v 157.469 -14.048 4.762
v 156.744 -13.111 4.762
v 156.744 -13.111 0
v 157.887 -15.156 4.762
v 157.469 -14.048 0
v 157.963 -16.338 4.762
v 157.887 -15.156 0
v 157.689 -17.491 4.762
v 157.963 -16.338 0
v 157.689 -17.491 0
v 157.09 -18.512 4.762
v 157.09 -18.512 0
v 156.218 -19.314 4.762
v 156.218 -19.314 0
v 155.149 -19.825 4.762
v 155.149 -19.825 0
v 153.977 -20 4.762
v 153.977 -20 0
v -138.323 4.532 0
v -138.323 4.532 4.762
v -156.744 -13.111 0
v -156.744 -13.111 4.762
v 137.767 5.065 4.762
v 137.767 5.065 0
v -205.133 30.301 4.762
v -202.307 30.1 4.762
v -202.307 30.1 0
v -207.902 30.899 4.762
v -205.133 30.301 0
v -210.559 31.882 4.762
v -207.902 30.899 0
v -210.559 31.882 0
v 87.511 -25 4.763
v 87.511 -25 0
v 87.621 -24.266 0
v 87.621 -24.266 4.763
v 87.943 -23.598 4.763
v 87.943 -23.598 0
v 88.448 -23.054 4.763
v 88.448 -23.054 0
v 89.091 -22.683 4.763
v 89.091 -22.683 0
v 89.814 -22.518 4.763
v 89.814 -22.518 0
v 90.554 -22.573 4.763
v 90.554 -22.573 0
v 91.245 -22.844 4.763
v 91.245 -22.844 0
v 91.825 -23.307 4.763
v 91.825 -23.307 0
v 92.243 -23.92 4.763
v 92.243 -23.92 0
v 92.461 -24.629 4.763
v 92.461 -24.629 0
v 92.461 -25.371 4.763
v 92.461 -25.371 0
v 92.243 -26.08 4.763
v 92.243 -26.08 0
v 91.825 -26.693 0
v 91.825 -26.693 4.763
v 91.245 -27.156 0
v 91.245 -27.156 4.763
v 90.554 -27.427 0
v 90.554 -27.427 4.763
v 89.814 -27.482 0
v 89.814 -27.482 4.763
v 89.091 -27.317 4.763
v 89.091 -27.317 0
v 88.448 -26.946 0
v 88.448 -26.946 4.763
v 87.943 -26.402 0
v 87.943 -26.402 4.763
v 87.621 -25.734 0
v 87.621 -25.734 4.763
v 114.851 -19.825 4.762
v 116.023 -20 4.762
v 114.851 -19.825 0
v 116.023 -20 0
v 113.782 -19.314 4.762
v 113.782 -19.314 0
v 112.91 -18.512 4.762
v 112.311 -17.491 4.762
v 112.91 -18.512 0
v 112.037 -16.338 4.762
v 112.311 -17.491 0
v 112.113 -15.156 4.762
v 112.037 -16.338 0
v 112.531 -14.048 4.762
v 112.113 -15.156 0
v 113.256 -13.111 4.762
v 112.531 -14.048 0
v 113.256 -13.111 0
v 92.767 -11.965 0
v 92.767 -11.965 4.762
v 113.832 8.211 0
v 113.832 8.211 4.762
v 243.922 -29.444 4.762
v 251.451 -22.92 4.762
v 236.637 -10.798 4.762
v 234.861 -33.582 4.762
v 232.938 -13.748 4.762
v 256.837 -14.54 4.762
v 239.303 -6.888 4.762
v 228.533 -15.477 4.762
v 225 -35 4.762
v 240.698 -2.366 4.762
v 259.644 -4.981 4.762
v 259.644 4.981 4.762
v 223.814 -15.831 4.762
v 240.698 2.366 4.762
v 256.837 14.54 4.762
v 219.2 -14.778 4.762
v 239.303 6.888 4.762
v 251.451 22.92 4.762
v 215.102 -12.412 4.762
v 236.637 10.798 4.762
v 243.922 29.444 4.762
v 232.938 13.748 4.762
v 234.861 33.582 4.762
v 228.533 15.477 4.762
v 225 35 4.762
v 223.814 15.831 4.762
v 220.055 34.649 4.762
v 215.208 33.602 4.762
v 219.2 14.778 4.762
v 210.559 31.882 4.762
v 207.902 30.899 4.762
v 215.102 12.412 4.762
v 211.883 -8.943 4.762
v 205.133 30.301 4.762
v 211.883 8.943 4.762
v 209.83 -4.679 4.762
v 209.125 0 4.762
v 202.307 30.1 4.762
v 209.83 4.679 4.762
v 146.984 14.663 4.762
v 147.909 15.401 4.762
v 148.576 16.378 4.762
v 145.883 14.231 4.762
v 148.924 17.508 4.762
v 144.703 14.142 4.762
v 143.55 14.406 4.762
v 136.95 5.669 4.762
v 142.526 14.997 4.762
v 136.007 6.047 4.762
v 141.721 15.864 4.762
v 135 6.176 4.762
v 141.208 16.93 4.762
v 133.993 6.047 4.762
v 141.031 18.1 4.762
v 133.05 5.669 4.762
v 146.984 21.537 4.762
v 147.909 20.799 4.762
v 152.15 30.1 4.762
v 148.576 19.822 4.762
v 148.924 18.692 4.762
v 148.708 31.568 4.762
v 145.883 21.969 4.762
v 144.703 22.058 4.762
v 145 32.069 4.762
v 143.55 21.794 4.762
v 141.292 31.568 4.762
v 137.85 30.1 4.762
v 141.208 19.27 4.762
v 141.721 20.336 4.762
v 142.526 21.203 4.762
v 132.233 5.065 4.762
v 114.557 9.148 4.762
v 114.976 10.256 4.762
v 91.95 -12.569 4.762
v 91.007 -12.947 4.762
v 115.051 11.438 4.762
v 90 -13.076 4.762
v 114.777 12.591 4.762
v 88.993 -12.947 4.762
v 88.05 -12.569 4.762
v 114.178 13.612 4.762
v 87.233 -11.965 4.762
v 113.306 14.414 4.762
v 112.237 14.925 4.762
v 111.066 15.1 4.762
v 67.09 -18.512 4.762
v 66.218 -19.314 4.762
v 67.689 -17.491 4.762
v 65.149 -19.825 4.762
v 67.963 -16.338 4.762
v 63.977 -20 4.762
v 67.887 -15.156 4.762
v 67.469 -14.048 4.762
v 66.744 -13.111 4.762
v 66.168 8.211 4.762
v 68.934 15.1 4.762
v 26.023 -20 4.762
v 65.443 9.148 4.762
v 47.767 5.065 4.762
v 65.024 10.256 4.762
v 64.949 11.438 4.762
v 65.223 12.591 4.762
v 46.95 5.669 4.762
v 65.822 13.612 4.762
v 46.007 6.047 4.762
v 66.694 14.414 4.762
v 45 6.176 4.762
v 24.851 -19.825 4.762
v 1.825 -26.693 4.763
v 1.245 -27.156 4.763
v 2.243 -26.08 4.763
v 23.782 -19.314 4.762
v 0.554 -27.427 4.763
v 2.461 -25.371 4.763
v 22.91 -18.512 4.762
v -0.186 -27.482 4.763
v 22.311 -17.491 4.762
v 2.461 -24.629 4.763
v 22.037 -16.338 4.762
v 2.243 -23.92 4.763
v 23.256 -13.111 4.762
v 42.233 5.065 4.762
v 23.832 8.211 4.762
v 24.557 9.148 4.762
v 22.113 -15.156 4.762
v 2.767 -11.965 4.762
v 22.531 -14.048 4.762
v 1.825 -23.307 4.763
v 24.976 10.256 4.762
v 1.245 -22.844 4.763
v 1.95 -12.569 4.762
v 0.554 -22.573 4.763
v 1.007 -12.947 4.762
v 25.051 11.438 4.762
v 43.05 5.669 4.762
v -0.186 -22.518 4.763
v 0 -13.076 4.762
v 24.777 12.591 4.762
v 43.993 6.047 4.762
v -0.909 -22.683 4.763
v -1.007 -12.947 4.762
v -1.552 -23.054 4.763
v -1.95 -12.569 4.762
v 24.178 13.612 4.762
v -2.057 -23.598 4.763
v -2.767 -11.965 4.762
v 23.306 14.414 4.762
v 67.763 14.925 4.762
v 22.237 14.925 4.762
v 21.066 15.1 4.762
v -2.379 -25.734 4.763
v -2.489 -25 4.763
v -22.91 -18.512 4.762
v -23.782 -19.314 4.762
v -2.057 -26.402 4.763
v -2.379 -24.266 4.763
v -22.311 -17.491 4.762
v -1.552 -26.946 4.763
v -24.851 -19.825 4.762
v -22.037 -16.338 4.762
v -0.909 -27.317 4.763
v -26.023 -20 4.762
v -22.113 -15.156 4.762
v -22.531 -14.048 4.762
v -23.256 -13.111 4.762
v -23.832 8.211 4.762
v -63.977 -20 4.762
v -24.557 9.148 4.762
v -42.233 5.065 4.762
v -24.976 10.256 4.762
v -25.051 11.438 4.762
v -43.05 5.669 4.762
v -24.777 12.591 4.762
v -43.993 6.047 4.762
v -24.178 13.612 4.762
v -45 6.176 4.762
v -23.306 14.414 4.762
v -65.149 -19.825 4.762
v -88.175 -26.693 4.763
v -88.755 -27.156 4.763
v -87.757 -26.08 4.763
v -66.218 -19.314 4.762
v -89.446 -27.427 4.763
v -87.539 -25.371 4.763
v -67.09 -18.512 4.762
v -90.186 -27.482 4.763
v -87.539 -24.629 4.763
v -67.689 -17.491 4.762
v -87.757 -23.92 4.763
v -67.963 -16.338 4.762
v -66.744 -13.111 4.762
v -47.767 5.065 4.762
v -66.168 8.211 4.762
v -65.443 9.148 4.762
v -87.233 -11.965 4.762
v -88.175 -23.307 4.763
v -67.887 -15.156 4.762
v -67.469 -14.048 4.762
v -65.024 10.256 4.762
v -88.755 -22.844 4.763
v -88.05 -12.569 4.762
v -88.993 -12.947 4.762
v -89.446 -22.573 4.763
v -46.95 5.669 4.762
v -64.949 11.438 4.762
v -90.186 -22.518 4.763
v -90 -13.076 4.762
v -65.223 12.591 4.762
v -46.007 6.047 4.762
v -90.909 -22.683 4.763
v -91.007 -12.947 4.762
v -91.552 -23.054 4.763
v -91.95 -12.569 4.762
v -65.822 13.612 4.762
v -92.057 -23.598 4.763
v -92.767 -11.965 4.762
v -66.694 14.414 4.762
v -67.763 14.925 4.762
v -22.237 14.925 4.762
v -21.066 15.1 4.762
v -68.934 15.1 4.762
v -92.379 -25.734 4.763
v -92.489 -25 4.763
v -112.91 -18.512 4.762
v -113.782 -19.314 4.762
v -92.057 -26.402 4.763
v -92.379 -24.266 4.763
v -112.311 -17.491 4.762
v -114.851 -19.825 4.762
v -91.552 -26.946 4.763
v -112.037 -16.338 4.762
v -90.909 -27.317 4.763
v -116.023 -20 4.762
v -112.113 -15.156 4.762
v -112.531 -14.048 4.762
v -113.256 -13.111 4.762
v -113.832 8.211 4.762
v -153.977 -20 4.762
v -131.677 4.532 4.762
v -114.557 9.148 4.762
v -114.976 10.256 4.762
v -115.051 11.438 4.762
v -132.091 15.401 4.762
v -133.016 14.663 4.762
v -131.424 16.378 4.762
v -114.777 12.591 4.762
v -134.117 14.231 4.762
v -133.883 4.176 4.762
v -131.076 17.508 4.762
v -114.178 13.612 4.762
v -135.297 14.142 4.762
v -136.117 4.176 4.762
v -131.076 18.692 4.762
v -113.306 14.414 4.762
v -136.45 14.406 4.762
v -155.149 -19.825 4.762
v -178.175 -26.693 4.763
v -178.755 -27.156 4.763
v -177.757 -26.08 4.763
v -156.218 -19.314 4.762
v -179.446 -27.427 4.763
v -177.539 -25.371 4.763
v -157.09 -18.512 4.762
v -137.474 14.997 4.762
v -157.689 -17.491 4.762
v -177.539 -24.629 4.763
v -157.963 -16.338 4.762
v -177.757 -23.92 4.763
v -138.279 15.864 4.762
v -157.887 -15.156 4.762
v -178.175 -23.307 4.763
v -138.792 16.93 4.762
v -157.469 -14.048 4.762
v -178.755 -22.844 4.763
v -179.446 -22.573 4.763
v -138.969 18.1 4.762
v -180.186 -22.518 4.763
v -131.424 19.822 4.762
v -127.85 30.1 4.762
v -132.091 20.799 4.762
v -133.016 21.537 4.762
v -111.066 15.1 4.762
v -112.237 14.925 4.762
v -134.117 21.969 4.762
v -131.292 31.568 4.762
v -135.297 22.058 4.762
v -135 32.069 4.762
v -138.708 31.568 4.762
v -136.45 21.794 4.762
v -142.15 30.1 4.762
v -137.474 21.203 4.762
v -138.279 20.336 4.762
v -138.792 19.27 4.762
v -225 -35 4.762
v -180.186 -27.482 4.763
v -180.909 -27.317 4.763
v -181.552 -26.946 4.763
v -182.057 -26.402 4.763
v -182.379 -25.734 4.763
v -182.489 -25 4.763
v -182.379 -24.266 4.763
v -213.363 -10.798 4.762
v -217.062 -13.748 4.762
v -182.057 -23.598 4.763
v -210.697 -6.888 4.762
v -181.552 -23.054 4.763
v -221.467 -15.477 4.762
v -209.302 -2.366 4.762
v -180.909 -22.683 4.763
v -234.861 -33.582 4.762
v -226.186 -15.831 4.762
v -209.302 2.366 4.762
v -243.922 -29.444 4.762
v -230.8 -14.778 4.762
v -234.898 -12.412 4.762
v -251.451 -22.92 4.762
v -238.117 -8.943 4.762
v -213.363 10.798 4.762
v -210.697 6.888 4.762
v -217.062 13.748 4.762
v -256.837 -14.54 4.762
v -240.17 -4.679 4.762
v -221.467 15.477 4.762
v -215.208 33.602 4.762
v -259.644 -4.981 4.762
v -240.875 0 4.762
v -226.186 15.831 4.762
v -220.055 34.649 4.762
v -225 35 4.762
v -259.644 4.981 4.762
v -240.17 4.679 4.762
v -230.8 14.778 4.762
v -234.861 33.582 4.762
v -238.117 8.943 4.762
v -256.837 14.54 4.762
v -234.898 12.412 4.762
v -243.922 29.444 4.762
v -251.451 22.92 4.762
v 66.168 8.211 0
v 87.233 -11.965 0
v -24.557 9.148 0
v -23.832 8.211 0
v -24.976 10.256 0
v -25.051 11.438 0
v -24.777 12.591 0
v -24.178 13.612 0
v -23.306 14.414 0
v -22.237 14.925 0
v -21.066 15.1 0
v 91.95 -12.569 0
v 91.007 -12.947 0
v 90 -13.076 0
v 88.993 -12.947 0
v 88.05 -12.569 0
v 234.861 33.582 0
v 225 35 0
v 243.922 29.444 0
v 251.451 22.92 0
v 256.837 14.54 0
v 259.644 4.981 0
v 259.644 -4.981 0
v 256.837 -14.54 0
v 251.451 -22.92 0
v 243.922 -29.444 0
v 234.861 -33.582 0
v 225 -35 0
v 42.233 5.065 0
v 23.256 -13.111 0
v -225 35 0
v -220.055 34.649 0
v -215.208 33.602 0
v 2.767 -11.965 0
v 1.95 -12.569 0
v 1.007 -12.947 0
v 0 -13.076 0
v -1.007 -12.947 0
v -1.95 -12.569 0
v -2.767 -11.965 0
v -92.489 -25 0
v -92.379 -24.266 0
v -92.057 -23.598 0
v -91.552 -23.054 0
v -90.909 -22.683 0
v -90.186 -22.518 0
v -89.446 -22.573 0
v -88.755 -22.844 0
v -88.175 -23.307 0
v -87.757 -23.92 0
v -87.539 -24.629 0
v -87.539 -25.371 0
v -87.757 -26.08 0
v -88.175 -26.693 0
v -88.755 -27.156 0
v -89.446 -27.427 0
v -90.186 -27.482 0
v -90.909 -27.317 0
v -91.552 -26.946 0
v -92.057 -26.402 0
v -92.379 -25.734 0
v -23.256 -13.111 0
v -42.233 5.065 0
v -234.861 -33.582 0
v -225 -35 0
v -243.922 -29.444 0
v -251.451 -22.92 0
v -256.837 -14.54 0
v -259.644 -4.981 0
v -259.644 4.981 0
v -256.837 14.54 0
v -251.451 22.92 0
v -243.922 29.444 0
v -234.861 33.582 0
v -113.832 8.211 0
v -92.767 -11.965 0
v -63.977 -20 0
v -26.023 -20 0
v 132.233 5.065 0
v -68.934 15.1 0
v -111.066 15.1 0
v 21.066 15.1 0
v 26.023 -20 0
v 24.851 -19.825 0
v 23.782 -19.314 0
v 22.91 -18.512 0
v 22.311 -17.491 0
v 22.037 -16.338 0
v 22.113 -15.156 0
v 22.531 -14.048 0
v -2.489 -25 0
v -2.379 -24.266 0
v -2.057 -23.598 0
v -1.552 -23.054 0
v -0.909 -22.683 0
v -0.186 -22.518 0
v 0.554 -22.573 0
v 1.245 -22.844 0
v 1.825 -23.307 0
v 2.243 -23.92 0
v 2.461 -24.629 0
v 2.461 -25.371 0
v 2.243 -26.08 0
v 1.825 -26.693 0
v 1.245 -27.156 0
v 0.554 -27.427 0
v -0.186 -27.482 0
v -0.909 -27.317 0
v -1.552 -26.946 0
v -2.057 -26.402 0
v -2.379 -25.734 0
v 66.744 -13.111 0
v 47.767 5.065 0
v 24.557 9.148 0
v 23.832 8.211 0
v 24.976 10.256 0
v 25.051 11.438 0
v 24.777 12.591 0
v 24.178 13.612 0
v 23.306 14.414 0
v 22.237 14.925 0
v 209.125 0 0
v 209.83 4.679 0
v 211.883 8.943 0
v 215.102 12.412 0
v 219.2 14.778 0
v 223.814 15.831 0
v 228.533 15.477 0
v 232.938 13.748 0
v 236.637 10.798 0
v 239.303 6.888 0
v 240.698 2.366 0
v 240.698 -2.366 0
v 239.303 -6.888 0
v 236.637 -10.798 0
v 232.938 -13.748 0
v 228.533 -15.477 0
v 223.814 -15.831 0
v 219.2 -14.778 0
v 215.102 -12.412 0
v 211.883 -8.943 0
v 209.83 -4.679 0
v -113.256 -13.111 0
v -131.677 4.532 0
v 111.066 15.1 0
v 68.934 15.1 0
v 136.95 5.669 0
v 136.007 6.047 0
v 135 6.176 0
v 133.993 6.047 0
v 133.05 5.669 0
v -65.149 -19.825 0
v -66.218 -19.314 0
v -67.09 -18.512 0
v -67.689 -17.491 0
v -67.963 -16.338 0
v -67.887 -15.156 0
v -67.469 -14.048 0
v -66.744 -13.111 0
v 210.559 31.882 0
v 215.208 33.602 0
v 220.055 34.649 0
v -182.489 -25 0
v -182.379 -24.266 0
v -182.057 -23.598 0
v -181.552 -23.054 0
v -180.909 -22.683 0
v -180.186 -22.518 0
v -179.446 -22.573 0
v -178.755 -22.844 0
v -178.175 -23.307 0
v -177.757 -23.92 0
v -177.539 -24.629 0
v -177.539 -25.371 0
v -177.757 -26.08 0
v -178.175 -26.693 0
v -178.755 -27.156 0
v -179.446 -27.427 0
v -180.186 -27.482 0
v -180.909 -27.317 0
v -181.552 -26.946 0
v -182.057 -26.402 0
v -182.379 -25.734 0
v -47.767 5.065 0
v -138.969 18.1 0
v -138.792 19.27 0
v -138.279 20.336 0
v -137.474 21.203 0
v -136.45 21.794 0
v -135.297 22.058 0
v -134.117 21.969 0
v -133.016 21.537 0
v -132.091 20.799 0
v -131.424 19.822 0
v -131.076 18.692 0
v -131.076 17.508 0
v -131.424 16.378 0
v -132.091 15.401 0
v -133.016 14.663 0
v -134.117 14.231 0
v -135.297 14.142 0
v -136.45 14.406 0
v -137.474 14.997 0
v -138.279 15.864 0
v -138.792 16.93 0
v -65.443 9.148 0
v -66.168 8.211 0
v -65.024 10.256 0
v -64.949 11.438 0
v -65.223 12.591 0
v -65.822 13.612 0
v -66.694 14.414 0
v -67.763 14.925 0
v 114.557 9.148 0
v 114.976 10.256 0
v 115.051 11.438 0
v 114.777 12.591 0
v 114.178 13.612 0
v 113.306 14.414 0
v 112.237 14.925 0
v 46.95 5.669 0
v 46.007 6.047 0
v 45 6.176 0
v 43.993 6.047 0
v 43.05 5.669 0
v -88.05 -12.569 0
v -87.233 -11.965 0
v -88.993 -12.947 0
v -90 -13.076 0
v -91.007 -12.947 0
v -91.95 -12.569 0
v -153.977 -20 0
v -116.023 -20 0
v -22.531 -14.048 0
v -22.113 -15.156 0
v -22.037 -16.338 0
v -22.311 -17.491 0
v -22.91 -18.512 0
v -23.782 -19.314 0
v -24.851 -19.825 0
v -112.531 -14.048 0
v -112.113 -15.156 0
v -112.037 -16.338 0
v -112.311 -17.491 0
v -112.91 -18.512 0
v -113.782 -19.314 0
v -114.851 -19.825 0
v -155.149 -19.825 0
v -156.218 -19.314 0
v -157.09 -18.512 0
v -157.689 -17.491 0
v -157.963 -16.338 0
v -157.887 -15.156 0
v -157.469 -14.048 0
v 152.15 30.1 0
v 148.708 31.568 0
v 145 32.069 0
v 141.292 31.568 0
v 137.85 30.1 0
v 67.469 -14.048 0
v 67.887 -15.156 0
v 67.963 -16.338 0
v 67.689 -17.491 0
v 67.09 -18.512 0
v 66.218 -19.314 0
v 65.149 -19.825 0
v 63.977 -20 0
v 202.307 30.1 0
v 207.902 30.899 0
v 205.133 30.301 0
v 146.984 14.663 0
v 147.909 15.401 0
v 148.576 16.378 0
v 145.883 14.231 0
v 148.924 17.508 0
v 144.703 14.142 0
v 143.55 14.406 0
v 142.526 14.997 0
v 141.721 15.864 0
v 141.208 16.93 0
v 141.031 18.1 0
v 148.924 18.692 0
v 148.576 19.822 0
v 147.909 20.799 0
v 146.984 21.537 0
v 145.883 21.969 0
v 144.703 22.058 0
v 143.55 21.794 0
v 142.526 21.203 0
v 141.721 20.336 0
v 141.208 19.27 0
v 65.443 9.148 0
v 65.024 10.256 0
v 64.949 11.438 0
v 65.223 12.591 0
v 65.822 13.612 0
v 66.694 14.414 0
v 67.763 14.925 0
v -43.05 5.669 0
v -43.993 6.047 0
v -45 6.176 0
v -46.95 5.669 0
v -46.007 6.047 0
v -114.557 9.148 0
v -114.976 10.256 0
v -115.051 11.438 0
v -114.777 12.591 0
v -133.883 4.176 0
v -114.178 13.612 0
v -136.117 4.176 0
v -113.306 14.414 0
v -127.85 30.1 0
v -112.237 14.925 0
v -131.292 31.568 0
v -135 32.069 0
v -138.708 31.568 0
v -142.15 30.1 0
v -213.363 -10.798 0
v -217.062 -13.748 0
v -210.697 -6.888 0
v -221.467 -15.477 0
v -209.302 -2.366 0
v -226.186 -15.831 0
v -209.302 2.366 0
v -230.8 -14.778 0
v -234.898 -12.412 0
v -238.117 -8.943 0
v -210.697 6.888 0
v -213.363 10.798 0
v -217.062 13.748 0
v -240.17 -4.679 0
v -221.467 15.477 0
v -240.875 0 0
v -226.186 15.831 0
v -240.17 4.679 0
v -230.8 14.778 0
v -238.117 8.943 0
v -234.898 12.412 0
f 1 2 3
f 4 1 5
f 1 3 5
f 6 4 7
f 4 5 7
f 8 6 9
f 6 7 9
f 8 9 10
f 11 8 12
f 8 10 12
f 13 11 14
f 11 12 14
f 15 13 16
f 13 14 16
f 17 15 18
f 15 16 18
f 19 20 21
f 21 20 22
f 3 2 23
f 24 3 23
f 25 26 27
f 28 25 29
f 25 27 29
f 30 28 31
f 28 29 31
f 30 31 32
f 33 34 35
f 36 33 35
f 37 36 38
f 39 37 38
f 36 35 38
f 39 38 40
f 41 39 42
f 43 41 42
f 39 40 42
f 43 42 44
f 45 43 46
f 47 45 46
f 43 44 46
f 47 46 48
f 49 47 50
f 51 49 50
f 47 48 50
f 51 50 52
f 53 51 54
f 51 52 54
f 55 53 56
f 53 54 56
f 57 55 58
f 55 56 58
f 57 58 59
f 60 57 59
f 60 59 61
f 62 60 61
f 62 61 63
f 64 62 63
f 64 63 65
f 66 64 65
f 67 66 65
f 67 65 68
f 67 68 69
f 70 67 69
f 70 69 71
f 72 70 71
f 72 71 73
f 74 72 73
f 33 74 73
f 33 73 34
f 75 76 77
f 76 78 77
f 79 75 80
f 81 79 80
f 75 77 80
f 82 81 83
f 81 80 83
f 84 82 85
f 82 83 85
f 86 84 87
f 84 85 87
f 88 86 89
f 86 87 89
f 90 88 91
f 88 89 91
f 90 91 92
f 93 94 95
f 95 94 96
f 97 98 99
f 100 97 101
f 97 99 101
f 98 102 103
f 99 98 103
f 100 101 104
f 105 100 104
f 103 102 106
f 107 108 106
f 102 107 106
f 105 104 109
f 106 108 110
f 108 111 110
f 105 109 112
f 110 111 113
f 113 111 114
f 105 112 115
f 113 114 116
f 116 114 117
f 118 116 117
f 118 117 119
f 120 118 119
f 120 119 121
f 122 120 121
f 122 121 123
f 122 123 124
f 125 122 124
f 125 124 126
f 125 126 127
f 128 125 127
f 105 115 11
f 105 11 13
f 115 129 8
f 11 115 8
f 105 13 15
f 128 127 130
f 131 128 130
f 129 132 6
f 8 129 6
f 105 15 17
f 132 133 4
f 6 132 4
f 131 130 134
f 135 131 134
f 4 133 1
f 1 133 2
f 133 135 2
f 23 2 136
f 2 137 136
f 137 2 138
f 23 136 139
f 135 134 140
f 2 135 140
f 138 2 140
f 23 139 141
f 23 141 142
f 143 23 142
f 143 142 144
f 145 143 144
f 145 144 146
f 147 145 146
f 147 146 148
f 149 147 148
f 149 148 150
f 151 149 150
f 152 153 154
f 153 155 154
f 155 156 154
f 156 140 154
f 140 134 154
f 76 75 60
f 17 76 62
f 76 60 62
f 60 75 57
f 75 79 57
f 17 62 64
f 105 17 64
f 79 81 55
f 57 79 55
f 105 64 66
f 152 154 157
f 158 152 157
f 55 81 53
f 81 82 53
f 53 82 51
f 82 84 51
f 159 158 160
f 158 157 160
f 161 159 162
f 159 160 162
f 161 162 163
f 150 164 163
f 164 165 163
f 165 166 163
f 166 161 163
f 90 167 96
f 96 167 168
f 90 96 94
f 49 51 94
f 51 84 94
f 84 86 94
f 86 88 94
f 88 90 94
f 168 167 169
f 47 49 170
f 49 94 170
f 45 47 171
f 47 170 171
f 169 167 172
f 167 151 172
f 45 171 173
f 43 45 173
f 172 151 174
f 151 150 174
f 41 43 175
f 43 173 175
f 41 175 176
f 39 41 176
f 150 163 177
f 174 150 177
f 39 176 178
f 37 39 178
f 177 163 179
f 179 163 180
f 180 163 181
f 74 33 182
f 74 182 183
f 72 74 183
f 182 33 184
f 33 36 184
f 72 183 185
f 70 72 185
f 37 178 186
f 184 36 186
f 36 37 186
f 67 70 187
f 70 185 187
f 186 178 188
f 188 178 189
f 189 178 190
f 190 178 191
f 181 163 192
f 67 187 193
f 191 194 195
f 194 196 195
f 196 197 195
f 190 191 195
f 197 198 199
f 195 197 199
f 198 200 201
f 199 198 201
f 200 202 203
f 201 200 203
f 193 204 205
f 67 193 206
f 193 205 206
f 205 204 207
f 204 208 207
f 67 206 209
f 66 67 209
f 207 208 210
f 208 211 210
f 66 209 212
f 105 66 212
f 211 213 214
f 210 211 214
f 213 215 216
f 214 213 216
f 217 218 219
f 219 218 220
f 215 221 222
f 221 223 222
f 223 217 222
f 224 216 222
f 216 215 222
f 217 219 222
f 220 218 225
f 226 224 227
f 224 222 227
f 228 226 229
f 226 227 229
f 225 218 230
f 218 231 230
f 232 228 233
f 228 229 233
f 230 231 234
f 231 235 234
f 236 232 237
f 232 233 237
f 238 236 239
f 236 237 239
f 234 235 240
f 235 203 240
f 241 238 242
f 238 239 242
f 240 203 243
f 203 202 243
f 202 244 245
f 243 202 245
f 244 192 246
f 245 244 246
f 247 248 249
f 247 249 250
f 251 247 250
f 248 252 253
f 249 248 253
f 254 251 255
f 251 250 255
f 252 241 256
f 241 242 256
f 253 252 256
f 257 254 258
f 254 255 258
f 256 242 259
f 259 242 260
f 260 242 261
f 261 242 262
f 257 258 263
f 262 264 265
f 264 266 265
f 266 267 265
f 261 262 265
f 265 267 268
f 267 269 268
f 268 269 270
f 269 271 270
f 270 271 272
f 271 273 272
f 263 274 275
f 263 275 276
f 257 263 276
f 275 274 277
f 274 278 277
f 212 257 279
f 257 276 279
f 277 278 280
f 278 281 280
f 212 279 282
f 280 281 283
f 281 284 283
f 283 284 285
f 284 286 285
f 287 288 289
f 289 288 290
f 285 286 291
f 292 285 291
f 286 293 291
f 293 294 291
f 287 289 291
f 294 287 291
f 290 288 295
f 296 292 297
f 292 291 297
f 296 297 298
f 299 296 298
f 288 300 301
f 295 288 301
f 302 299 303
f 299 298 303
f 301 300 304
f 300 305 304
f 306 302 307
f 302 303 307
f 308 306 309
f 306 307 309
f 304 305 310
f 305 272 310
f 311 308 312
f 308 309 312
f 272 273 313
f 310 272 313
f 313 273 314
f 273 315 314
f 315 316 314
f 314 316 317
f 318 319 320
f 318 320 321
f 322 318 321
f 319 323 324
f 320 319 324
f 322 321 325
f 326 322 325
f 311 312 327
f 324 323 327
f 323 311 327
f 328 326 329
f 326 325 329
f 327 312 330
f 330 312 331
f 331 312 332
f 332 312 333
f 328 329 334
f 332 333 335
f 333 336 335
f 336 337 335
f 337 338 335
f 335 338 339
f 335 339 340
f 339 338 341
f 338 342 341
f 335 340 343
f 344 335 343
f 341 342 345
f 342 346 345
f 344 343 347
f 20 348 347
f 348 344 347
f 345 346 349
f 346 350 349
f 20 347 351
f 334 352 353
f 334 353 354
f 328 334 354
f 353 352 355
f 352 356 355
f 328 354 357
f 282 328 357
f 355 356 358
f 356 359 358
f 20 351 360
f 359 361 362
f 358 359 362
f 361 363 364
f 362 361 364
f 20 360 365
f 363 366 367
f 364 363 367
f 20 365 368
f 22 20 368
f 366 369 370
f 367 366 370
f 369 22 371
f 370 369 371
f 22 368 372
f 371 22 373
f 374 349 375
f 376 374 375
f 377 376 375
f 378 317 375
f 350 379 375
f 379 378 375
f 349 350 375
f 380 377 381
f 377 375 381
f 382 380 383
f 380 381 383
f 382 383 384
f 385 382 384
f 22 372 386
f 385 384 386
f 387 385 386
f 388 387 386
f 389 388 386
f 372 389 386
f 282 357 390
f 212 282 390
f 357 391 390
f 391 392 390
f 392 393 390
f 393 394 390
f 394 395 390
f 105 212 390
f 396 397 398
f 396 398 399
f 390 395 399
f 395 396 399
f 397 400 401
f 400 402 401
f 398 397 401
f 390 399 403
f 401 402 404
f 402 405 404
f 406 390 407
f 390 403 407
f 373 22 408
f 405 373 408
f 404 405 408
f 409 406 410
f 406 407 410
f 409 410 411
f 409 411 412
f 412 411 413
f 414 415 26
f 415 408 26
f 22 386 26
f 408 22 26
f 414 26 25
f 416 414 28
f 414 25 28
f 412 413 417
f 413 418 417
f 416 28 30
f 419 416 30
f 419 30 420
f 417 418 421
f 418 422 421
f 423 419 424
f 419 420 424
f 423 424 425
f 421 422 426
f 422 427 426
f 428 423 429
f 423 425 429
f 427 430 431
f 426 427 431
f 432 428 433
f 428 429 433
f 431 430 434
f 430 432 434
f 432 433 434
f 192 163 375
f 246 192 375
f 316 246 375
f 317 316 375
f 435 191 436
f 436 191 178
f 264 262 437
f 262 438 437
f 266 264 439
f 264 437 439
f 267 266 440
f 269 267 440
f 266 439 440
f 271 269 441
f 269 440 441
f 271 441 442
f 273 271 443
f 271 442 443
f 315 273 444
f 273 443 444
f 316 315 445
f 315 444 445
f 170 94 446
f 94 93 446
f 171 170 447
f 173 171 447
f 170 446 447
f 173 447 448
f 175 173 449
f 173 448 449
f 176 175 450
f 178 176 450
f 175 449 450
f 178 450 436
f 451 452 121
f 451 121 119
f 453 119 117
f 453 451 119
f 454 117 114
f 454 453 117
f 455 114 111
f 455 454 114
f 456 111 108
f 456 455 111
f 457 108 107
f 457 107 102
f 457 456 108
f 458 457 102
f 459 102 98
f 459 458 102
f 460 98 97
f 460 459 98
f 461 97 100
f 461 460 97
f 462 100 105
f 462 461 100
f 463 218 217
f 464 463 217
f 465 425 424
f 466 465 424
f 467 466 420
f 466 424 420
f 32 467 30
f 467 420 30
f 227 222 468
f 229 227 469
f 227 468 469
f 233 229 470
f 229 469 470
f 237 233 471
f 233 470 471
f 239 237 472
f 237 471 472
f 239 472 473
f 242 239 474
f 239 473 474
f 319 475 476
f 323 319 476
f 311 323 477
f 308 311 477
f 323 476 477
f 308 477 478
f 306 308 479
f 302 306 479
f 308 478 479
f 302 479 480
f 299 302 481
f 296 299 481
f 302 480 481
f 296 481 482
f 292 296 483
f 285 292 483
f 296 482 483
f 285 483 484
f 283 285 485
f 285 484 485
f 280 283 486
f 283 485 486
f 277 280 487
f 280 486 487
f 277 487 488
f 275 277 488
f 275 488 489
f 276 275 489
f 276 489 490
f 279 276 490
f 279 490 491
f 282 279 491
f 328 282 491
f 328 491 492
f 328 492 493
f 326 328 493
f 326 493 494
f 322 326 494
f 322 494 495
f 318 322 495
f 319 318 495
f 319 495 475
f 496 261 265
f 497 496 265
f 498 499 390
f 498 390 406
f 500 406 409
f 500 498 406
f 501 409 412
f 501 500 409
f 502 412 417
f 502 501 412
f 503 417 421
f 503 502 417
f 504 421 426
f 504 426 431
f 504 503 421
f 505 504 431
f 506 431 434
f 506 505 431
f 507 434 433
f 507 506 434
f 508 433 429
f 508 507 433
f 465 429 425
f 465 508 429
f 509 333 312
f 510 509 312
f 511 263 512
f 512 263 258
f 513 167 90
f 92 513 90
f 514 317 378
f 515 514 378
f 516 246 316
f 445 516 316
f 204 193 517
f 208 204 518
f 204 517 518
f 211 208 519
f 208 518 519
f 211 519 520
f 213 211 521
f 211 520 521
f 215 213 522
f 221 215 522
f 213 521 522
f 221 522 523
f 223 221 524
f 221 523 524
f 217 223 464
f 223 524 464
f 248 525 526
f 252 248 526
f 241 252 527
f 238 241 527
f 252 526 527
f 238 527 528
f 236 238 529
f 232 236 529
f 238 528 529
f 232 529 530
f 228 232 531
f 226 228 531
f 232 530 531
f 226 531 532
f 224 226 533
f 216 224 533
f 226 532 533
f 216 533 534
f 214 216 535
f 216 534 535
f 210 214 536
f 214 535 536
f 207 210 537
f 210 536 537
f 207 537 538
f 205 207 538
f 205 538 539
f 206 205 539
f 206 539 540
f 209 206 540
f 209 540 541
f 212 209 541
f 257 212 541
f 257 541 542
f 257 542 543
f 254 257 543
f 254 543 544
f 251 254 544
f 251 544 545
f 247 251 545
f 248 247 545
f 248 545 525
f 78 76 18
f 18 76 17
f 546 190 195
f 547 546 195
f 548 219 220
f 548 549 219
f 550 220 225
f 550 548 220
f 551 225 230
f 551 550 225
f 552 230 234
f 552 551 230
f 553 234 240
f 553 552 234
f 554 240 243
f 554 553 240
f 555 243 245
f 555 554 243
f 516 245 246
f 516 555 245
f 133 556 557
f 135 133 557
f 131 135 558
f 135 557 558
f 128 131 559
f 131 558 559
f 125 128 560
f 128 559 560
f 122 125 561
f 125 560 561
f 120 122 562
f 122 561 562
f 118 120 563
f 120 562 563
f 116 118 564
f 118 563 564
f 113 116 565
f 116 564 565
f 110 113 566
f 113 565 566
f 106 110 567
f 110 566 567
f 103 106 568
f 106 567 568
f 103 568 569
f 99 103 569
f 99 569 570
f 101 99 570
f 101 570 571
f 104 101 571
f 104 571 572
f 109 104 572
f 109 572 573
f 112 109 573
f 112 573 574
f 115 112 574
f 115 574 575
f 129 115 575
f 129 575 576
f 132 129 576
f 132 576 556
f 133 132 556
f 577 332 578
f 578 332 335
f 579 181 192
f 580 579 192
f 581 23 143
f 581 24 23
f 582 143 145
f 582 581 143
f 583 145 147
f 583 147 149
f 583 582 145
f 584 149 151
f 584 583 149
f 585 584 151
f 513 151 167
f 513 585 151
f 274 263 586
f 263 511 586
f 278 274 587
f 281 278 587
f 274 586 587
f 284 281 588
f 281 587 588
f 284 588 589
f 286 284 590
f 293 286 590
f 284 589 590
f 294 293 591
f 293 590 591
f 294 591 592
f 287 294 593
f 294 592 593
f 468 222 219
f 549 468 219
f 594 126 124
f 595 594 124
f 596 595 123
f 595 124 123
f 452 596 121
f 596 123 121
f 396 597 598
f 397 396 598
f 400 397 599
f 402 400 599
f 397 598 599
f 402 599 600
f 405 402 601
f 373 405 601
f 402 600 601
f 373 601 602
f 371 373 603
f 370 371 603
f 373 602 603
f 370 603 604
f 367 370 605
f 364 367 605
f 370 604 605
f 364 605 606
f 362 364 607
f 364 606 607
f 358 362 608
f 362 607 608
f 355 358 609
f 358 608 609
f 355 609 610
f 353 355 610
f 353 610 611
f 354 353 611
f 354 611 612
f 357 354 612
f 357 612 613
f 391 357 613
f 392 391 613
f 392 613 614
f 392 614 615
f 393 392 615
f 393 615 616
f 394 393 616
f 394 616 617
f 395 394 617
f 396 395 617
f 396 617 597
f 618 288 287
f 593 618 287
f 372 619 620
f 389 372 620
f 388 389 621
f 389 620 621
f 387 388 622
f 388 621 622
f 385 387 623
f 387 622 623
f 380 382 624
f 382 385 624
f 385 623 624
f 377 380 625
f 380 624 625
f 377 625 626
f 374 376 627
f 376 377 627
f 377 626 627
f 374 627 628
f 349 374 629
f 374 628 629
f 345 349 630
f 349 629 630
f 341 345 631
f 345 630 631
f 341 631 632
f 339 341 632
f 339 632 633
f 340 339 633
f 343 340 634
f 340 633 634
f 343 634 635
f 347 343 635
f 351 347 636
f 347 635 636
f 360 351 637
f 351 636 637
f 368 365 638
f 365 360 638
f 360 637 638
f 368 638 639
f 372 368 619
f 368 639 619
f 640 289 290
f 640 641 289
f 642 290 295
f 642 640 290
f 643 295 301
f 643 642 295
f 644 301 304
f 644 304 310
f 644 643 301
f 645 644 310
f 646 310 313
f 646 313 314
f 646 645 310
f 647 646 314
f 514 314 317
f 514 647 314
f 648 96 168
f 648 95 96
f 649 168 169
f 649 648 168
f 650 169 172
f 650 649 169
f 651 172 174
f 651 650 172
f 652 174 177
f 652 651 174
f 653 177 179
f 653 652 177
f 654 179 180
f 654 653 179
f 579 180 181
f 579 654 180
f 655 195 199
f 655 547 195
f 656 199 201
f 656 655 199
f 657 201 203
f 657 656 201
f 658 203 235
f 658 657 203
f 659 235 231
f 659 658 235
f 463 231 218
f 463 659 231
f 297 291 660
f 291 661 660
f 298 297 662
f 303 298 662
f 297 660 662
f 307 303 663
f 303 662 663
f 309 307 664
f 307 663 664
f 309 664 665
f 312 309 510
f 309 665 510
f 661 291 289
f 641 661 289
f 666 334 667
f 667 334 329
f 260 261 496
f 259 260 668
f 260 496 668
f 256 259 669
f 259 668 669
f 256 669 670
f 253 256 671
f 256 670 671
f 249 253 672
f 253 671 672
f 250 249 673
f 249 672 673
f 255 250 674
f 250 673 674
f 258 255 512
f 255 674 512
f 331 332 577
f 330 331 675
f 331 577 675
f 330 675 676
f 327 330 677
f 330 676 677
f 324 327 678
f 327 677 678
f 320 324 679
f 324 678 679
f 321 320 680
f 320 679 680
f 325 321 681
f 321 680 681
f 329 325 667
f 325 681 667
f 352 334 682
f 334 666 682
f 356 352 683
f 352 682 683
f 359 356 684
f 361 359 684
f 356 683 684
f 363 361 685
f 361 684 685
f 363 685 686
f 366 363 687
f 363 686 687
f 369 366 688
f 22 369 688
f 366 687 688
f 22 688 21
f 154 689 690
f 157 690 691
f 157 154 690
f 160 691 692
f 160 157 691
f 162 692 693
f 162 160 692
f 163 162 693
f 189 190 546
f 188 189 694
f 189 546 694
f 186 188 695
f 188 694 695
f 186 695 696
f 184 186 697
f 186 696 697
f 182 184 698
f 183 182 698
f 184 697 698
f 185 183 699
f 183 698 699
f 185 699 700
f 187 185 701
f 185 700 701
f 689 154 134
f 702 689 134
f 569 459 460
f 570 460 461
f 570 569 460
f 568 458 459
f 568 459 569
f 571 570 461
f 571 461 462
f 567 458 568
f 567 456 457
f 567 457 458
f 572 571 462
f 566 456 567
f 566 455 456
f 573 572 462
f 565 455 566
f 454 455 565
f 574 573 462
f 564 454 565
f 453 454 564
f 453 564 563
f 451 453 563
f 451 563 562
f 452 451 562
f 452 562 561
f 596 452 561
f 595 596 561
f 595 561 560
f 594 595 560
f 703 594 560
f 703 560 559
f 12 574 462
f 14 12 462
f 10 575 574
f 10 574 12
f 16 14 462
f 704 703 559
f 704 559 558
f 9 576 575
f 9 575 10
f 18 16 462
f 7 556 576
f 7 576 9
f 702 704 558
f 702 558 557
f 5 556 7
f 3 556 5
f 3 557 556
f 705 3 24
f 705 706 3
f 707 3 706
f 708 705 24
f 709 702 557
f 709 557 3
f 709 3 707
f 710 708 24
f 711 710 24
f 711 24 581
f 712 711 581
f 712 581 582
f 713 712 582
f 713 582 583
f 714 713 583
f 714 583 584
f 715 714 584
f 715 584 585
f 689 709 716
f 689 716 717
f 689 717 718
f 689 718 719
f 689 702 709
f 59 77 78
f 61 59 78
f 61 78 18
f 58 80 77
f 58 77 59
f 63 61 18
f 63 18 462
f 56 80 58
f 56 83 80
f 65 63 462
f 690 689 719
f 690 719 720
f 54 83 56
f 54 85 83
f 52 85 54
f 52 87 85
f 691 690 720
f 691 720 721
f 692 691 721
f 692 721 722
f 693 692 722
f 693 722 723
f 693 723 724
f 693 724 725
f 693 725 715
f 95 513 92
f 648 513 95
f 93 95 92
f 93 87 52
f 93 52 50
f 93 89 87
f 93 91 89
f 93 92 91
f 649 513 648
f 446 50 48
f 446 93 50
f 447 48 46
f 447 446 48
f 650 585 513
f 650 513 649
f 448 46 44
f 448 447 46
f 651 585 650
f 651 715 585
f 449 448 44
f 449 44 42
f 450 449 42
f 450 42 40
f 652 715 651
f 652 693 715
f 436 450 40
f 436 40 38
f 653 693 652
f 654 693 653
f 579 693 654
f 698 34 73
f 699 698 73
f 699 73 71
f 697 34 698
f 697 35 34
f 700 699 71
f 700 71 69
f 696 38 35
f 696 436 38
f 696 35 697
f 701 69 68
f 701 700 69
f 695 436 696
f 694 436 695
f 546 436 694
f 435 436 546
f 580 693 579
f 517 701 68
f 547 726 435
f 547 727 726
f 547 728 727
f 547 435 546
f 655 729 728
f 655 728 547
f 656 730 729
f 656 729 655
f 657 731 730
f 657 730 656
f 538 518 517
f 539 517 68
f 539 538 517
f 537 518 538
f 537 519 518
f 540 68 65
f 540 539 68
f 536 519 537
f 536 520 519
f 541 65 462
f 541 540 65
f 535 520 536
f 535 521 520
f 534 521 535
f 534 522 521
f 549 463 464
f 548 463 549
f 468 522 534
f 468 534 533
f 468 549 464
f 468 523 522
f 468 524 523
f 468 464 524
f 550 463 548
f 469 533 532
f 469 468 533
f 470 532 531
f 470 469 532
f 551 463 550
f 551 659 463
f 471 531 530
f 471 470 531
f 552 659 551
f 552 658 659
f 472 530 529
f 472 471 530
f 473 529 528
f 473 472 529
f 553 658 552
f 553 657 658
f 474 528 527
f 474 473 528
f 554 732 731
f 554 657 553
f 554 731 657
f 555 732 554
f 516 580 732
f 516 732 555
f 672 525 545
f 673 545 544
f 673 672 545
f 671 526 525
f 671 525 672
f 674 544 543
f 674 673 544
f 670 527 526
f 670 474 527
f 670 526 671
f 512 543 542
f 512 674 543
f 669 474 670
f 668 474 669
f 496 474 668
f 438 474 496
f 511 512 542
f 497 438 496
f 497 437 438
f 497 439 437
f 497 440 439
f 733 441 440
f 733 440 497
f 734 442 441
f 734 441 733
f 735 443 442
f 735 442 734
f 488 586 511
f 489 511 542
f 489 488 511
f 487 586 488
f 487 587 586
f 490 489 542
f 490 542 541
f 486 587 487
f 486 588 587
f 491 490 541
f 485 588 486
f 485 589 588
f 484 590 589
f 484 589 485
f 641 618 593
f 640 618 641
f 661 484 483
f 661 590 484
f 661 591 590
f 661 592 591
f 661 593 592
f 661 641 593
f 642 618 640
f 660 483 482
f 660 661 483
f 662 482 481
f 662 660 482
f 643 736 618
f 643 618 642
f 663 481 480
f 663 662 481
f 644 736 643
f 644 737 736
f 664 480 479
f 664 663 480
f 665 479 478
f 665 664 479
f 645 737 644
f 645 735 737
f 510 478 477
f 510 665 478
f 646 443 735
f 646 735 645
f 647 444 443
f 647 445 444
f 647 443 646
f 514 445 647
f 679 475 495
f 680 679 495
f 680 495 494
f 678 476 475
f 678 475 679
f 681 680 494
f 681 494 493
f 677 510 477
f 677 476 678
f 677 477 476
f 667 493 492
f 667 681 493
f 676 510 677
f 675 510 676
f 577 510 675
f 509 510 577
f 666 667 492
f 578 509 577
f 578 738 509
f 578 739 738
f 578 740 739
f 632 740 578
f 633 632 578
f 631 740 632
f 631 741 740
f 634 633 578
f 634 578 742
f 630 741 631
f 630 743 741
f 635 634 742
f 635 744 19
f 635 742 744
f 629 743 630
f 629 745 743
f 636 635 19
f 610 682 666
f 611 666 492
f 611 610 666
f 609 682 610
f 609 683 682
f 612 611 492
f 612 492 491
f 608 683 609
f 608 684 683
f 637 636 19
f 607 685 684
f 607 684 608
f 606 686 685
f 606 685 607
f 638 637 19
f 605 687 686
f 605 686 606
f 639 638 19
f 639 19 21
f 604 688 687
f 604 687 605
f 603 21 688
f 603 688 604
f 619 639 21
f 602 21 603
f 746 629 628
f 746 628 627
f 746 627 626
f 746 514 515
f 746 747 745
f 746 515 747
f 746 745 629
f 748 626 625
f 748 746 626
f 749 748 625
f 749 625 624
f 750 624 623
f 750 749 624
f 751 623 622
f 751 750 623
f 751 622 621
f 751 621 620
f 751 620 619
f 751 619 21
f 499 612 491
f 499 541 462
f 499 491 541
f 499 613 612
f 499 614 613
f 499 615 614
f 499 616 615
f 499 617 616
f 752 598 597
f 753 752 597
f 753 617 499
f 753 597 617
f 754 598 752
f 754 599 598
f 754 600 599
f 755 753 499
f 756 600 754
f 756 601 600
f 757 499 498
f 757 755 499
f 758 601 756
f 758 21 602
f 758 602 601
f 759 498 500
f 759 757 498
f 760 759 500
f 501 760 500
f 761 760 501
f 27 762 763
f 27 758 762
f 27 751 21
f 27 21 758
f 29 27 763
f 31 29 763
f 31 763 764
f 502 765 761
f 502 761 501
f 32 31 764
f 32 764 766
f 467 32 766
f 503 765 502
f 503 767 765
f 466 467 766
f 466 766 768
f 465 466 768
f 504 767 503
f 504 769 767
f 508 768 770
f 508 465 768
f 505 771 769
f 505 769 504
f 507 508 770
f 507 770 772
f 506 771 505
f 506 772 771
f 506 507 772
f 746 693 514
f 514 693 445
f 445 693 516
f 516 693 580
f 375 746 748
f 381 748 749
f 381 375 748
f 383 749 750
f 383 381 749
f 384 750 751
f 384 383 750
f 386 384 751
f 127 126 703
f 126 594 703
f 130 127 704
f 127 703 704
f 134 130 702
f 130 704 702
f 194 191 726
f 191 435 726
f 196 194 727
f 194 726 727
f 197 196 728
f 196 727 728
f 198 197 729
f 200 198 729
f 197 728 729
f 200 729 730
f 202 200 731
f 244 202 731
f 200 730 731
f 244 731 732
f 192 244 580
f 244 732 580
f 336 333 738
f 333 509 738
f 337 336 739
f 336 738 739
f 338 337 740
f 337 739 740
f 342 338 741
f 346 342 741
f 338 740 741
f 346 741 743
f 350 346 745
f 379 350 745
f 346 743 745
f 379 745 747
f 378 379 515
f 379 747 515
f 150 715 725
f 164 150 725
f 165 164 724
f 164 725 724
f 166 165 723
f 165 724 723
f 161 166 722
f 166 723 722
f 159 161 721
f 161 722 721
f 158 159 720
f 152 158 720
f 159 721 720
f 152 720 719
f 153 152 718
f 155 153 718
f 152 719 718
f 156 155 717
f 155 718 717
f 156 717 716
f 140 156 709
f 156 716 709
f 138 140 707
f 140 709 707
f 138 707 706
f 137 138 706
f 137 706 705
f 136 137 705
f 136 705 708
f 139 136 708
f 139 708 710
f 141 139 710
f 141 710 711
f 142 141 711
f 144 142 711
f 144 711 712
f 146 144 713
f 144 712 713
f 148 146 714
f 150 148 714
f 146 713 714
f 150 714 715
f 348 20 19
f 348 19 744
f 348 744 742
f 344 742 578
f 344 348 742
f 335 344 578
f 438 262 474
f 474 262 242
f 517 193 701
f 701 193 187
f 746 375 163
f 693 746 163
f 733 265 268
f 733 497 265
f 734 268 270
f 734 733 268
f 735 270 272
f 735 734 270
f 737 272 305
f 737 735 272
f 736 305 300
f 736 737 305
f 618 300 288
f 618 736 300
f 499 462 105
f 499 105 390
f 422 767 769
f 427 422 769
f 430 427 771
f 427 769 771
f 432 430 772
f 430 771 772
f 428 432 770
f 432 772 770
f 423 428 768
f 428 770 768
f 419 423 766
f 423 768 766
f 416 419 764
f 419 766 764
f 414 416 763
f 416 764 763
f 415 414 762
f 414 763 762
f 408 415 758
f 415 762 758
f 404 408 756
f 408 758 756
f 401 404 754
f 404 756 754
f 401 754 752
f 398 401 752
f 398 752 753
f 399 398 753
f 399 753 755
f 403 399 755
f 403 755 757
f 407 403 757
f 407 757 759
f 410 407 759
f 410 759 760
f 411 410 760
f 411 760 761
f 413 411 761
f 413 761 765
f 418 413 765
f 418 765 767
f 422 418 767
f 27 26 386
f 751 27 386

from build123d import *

# Parameters (mm, degrees)
BOSS_EXTRUDE1_DEPTH     = 4.7625
SKETCH2_R               = 3.96875
SKETCH2_R_2             = 15.875
CUT_EXTRUDE1_DEPTH      = 1
CUT_EXTRUDE1_DEPTH_BACK = 5.7625
F_10_CLEARANCE_HOLE2_D  = 4.9784
CUT_EXTRUDE3_DEPTH      = 5.7625
CUT_EXTRUDE4_DEPTH      = 5.7625
FILLET1_R               = 4
LPATTERN1_COUNT         = 4
LPATTERN1_PITCH         = 90
FILLET1_OF_LPATTERN1_R  = 4
CUT_EXTRUDE5_DEPTH      = 5.7625
FILLET2_R               = 4
LPATTERN2_COUNT         = 3
LPATTERN2_PITCH         = 90
FILLET2_OF_LPATTERN2_R  = 4
SKETCH13_R              = 13.96875
SKETCH13_R_2            = 3.96875
BOSS_EXTRUDE2_DEPTH     = 4.7625
FILLET3_R               = 20


with BuildPart() as part:
    # Sketch1 → Boss-Extrude1 (new body)
    with BuildSketch(Plane.XY):
        with BuildLine():
            Line((-225, 35), (225, 35))
            ThreePointArc((225, 35), (260, 0), (225, -35))
            Line((225, -35), (-225, -35))
            ThreePointArc((-225, -35), (-260, 0), (-225, 35))
        make_face()
    extrude(amount=BOSS_EXTRUDE1_DEPTH)

    # Sketch2 → Cut-Extrude1 (cut, two sides)
    with BuildSketch(Plane(origin=(0, 0, 0), x_dir=(-1, 0, 0), z_dir=(0, 0, -1))) as cut_extrude1_sk:
        with Locations((-145, 18.1)):
            Circle(SKETCH2_R)
        with Locations((135, 18.1)):
            Circle(SKETCH2_R)
        with Locations((-225, 0)):
            Circle(SKETCH2_R_2)
        with Locations((225, 0)):
            Circle(SKETCH2_R_2)
    extrude(amount=CUT_EXTRUDE1_DEPTH, mode=Mode.SUBTRACT)
    extrude(cut_extrude1_sk.sketch, amount=-CUT_EXTRUDE1_DEPTH_BACK, mode=Mode.SUBTRACT)

    # #10 Clearance Hole2 (through all)
    with Locations(Plane.XY.offset(4.7625)):
        with Locations((-180, -25), (-90, -25), (0, -25), (90, -25)):
            Hole(F_10_CLEARANCE_HOLE2_D / 2)

    # Sketch16 → Cut-Extrude3 (cut, through all)
    with BuildSketch(Plane.XY.offset(4.7625)):
        with BuildLine():
            Line((-207.139708849, 30.1), (207.139708849, 30.1))
            ThreePointArc((207.139708849, 30.1), (215.739870411, 33.752777663), (225, 35))
            Line((225, 35), (-225, 35))
            ThreePointArc((-225, 35), (-215.739870411, 33.752777663), (-207.139708849, 30.1))
        make_face()
    extrude(amount=-CUT_EXTRUDE3_DEPTH, mode=Mode.SUBTRACT)

    # Sketch17 → Cut-Extrude4 (cut, through all)
    with BuildSketch(Plane.XY.offset(4.7625)):
        Polygon((-106.063328248, -20), (-135, 7.714901167), (-163.936671752, -20), align=None)
    cut_extrude4 = extrude(amount=-CUT_EXTRUDE4_DEPTH, mode=Mode.SUBTRACT)

    # Fillet1
    fillet1_edges = [part.edges().sort_by_distance(p)[0] for p in [
        (-163.936671752, -20, 2.38125),
        (-135, 7.714901167, 2.38125),
        (-106.063328248, -20, 2.38125),
    ]]
    fillet(fillet1_edges, radius=FILLET1_R)

    # LPattern1: Cut-Extrude4 ×4
    with Locations(*[(i * LPATTERN1_PITCH, 0, 0) for i in range(1, LPATTERN1_COUNT)]):
        add(cut_extrude4, mode=Mode.SUBTRACT)

    # Fillet1 of LPattern1
    fillet1_of_lpattern1_edges = [part.edges().sort_by_distance(p)[0] for p in [
        (-73.936671752, -20, 2.38125),
        (-45, 7.714901167, 2.38125),
        (-16.063328248, -20, 2.38125),
        (16.063328248, -20, 2.38125),
        (45, 7.714901167, 2.38125),
        (73.936671752, -20, 2.38125),
        (106.063328248, -20, 2.38125),
        (135, 7.714901167, 2.38125),
        (163.936671752, -20, 2.38125),
    ]]
    fillet(fillet1_of_lpattern1_edges, radius=FILLET1_OF_LPATTERN1_R)

    # Sketch18 → Cut-Extrude5 (cut, through all)
    with BuildSketch(Plane.XY.offset(4.7625)):
        Polygon((-90, -14.614901167), (-58.975161195, 15.1), (-121.024838805, 15.1), align=None)
    cut_extrude5 = extrude(amount=-CUT_EXTRUDE5_DEPTH, mode=Mode.SUBTRACT)

    # Fillet2
    fillet2_edges = [part.edges().sort_by_distance(p)[0] for p in [
        (-121.024838805, 15.1, 2.38125),
        (-58.975161195, 15.1, 2.38125),
        (-90, -14.614901167, 2.38125),
    ]]
    fillet(fillet2_edges, radius=FILLET2_R)

    # LPattern2: Cut-Extrude5 ×3
    with Locations(*[(i * LPATTERN2_PITCH, 0, 0) for i in range(1, LPATTERN2_COUNT)]):
        add(cut_extrude5, mode=Mode.SUBTRACT)

    # Fillet2 of LPattern2
    fillet2_of_lpattern2_edges = [part.edges().sort_by_distance(p)[0] for p in [
        (-31.024838805, 15.1, 2.38125),
        (31.024838805, 15.1, 2.38125),
        (0, -14.614901167, 2.38125),
        (58.975161195, 15.1, 2.38125),
        (121.024838805, 15.1, 2.38125),
        (90, -14.614901167, 2.38125),
    ]]
    fillet(fillet2_of_lpattern2_edges, radius=FILLET2_OF_LPATTERN2_R)

    # Sketch13 → Boss-Extrude2 (add)
    with BuildSketch(Plane.XY.offset(4.7625)):
        with Locations((-135, 18.1)):
            Circle(SKETCH13_R)
        with Locations((-135, 18.1)):
            Circle(SKETCH13_R_2, mode=Mode.SUBTRACT)
        with Locations((145, 18.1)):
            Circle(SKETCH13_R)
        with Locations((145, 18.1)):
            Circle(SKETCH13_R_2, mode=Mode.SUBTRACT)
    extrude(amount=-BOSS_EXTRUDE2_DEPTH)

    # Fillet3
    fillet3_edges = [part.edges().sort_by_distance(p)[0] for p in [
        (-207.139708849, 30.1, 2.38125),
        (207.139708849, 30.1, 2.38125),
    ]]
    fillet(fillet3_edges, radius=FILLET3_R)


solid = part.part
